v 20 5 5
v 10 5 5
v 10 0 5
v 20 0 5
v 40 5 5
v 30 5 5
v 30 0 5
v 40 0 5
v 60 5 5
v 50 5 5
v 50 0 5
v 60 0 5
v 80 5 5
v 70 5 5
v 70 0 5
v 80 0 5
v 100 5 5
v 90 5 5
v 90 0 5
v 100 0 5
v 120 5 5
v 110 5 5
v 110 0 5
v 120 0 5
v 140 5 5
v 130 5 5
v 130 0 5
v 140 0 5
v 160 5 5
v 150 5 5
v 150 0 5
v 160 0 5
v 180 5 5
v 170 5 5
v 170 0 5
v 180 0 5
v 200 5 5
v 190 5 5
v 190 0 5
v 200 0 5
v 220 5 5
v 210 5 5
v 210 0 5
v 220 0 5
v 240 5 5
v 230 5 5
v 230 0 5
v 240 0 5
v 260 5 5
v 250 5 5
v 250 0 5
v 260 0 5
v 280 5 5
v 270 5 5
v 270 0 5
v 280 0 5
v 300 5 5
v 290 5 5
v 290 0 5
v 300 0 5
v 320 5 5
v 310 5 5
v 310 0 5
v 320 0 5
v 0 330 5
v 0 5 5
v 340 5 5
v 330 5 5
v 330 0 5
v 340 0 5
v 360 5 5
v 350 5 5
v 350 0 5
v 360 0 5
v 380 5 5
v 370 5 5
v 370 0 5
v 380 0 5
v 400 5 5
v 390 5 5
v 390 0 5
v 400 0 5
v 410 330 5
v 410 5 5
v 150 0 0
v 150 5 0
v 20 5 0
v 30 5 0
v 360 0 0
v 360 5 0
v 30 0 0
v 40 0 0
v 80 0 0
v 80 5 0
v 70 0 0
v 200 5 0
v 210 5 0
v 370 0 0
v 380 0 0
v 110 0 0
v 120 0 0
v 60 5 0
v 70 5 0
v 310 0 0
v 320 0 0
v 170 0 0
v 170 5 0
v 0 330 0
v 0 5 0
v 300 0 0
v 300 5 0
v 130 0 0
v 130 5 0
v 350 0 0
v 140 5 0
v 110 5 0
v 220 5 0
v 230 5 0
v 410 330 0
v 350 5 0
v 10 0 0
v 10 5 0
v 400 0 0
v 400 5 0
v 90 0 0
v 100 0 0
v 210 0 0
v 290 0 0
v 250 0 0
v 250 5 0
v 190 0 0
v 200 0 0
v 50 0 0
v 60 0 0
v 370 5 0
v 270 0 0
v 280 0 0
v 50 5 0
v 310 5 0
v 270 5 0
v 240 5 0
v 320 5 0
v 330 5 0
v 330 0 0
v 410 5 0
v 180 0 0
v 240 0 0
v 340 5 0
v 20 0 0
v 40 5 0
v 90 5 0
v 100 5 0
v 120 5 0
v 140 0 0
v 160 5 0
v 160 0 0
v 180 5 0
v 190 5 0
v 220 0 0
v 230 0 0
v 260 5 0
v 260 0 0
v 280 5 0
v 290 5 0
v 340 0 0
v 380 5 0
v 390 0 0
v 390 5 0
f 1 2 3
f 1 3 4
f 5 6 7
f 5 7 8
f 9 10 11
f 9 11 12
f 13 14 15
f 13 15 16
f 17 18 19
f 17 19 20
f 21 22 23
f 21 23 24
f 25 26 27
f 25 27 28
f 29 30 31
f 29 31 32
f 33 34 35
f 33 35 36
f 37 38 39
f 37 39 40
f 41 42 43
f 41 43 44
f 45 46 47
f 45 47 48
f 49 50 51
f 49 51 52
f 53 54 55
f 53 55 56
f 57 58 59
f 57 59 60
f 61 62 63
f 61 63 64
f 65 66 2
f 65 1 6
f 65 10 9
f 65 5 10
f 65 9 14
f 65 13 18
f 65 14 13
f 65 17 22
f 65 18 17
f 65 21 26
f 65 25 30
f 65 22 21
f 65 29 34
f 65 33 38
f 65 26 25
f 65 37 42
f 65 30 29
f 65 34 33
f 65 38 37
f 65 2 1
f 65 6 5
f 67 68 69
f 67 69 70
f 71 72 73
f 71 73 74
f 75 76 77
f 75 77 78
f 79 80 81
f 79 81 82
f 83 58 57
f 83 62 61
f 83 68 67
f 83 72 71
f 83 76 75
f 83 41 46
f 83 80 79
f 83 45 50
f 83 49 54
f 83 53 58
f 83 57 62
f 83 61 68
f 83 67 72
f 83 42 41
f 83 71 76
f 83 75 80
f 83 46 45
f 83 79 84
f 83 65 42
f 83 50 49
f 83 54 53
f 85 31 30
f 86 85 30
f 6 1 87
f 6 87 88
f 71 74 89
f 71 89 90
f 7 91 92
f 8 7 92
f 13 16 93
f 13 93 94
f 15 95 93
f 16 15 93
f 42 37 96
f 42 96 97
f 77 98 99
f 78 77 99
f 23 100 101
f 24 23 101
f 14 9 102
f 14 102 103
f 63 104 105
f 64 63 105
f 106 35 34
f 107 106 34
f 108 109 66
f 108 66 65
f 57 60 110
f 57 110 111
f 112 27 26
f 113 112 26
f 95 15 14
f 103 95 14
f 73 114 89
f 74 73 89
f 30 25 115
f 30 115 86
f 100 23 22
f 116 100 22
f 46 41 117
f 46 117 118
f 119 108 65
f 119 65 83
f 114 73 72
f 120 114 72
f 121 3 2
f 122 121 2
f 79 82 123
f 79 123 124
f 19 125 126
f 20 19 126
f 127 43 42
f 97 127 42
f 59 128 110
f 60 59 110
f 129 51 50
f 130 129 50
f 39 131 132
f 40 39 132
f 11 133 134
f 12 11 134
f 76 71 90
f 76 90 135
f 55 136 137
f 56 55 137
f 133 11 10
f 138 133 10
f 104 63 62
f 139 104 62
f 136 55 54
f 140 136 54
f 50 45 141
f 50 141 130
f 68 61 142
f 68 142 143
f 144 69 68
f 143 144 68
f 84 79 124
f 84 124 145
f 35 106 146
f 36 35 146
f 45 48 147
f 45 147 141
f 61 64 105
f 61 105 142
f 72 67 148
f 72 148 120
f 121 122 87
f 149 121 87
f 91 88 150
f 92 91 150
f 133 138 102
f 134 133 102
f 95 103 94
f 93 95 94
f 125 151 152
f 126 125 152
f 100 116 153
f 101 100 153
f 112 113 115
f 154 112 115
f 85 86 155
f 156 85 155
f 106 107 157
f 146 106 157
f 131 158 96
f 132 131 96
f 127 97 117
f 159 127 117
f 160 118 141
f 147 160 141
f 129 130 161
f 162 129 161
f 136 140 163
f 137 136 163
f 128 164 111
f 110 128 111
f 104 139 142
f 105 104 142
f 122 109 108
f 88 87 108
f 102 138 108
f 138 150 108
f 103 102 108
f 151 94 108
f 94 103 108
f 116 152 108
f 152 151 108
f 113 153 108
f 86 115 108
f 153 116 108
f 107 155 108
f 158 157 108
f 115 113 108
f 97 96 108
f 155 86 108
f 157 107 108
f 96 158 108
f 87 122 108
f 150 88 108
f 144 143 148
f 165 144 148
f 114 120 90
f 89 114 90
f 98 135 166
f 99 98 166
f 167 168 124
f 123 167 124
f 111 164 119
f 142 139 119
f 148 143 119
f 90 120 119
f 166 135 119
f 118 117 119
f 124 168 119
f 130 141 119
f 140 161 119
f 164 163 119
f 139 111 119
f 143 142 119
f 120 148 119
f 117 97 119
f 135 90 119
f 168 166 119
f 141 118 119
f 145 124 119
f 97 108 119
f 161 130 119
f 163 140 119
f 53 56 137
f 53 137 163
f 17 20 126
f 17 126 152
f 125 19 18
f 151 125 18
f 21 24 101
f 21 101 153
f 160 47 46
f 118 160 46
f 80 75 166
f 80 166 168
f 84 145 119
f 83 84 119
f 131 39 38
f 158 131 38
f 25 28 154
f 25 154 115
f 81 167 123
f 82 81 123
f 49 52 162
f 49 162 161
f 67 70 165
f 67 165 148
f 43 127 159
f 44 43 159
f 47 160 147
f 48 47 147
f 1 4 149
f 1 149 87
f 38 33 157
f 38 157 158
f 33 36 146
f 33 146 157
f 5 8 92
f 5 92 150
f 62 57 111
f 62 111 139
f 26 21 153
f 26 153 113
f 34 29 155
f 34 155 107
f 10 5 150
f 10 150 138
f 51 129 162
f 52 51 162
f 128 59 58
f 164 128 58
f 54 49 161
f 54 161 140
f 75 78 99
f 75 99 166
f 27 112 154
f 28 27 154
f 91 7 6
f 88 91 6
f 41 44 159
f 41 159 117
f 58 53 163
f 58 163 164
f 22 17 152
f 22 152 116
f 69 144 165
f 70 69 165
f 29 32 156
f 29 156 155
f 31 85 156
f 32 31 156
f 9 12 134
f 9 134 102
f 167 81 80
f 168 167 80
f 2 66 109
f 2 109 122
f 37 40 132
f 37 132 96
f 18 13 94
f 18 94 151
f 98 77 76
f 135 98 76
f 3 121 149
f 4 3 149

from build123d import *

# Parameters (mm, degrees)
ESQUISSE1_W             = 410
ESQUISSE1_H             = 330
BOSS_EXTRU_1_DEPTH      = 5
ESQUISSE2_W             = 10
ESQUISSE2_H             = 5
ENL_V_MAT_EXTRU_1_DEPTH = 527.331644498


with BuildPart() as part:
    # Esquisse1 → Boss.-Extru.1 (new body)
    with BuildSketch(Plane.XY):
        with Locations((205, 165)):
            Rectangle(ESQUISSE1_W, ESQUISSE1_H)
    extrude(amount=BOSS_EXTRU_1_DEPTH)

    # Esquisse2 → Enlèv. mat.-Extru.1 (cut, through all)
    with BuildSketch(Plane.XY.offset(5)):
        with Locations((25, 2.5)):
            Rectangle(ESQUISSE2_W, ESQUISSE2_H)
        with Locations((5, 2.5)):
            Rectangle(ESQUISSE2_W, ESQUISSE2_H)
        with Locations((45, 2.5)):
            Rectangle(ESQUISSE2_W, ESQUISSE2_H)
        with Locations((65, 2.5)):
            Rectangle(ESQUISSE2_W, ESQUISSE2_H)
        with Locations((85, 2.5)):
            Rectangle(ESQUISSE2_W, ESQUISSE2_H)
        with Locations((105, 2.5)):
            Rectangle(ESQUISSE2_W, ESQUISSE2_H)
        with Locations((125, 2.5)):
            Rectangle(ESQUISSE2_W, ESQUISSE2_H)
        with Locations((145, 2.5)):
            Rectangle(ESQUISSE2_W, ESQUISSE2_H)
        with Locations((165, 2.5)):
            Rectangle(ESQUISSE2_W, ESQUISSE2_H)
        with Locations((185, 2.5)):
            Rectangle(ESQUISSE2_W, ESQUISSE2_H)
        with Locations((205, 2.5)):
            Rectangle(ESQUISSE2_W, ESQUISSE2_H)
        with Locations((225, 2.5)):
            Rectangle(ESQUISSE2_W, ESQUISSE2_H)
        with Locations((245, 2.5)):
            Rectangle(ESQUISSE2_W, ESQUISSE2_H)
        with Locations((265, 2.5)):
            Rectangle(ESQUISSE2_W, ESQUISSE2_H)
        with Locations((285, 2.5)):
            Rectangle(ESQUISSE2_W, ESQUISSE2_H)
        with Locations((305, 2.5)):
            Rectangle(ESQUISSE2_W, ESQUISSE2_H)
        with Locations((325, 2.5)):
            Rectangle(ESQUISSE2_W, ESQUISSE2_H)
        with Locations((345, 2.5)):
            Rectangle(ESQUISSE2_W, ESQUISSE2_H)
        with Locations((365, 2.5)):
            Rectangle(ESQUISSE2_W, ESQUISSE2_H)
        with Locations((385, 2.5)):
            Rectangle(ESQUISSE2_W, ESQUISSE2_H)
        with Locations((405, 2.5)):
            Rectangle(ESQUISSE2_W, ESQUISSE2_H)
    extrude(amount=-ENL_V_MAT_EXTRU_1_DEPTH, mode=Mode.SUBTRACT)


solid = part.part
